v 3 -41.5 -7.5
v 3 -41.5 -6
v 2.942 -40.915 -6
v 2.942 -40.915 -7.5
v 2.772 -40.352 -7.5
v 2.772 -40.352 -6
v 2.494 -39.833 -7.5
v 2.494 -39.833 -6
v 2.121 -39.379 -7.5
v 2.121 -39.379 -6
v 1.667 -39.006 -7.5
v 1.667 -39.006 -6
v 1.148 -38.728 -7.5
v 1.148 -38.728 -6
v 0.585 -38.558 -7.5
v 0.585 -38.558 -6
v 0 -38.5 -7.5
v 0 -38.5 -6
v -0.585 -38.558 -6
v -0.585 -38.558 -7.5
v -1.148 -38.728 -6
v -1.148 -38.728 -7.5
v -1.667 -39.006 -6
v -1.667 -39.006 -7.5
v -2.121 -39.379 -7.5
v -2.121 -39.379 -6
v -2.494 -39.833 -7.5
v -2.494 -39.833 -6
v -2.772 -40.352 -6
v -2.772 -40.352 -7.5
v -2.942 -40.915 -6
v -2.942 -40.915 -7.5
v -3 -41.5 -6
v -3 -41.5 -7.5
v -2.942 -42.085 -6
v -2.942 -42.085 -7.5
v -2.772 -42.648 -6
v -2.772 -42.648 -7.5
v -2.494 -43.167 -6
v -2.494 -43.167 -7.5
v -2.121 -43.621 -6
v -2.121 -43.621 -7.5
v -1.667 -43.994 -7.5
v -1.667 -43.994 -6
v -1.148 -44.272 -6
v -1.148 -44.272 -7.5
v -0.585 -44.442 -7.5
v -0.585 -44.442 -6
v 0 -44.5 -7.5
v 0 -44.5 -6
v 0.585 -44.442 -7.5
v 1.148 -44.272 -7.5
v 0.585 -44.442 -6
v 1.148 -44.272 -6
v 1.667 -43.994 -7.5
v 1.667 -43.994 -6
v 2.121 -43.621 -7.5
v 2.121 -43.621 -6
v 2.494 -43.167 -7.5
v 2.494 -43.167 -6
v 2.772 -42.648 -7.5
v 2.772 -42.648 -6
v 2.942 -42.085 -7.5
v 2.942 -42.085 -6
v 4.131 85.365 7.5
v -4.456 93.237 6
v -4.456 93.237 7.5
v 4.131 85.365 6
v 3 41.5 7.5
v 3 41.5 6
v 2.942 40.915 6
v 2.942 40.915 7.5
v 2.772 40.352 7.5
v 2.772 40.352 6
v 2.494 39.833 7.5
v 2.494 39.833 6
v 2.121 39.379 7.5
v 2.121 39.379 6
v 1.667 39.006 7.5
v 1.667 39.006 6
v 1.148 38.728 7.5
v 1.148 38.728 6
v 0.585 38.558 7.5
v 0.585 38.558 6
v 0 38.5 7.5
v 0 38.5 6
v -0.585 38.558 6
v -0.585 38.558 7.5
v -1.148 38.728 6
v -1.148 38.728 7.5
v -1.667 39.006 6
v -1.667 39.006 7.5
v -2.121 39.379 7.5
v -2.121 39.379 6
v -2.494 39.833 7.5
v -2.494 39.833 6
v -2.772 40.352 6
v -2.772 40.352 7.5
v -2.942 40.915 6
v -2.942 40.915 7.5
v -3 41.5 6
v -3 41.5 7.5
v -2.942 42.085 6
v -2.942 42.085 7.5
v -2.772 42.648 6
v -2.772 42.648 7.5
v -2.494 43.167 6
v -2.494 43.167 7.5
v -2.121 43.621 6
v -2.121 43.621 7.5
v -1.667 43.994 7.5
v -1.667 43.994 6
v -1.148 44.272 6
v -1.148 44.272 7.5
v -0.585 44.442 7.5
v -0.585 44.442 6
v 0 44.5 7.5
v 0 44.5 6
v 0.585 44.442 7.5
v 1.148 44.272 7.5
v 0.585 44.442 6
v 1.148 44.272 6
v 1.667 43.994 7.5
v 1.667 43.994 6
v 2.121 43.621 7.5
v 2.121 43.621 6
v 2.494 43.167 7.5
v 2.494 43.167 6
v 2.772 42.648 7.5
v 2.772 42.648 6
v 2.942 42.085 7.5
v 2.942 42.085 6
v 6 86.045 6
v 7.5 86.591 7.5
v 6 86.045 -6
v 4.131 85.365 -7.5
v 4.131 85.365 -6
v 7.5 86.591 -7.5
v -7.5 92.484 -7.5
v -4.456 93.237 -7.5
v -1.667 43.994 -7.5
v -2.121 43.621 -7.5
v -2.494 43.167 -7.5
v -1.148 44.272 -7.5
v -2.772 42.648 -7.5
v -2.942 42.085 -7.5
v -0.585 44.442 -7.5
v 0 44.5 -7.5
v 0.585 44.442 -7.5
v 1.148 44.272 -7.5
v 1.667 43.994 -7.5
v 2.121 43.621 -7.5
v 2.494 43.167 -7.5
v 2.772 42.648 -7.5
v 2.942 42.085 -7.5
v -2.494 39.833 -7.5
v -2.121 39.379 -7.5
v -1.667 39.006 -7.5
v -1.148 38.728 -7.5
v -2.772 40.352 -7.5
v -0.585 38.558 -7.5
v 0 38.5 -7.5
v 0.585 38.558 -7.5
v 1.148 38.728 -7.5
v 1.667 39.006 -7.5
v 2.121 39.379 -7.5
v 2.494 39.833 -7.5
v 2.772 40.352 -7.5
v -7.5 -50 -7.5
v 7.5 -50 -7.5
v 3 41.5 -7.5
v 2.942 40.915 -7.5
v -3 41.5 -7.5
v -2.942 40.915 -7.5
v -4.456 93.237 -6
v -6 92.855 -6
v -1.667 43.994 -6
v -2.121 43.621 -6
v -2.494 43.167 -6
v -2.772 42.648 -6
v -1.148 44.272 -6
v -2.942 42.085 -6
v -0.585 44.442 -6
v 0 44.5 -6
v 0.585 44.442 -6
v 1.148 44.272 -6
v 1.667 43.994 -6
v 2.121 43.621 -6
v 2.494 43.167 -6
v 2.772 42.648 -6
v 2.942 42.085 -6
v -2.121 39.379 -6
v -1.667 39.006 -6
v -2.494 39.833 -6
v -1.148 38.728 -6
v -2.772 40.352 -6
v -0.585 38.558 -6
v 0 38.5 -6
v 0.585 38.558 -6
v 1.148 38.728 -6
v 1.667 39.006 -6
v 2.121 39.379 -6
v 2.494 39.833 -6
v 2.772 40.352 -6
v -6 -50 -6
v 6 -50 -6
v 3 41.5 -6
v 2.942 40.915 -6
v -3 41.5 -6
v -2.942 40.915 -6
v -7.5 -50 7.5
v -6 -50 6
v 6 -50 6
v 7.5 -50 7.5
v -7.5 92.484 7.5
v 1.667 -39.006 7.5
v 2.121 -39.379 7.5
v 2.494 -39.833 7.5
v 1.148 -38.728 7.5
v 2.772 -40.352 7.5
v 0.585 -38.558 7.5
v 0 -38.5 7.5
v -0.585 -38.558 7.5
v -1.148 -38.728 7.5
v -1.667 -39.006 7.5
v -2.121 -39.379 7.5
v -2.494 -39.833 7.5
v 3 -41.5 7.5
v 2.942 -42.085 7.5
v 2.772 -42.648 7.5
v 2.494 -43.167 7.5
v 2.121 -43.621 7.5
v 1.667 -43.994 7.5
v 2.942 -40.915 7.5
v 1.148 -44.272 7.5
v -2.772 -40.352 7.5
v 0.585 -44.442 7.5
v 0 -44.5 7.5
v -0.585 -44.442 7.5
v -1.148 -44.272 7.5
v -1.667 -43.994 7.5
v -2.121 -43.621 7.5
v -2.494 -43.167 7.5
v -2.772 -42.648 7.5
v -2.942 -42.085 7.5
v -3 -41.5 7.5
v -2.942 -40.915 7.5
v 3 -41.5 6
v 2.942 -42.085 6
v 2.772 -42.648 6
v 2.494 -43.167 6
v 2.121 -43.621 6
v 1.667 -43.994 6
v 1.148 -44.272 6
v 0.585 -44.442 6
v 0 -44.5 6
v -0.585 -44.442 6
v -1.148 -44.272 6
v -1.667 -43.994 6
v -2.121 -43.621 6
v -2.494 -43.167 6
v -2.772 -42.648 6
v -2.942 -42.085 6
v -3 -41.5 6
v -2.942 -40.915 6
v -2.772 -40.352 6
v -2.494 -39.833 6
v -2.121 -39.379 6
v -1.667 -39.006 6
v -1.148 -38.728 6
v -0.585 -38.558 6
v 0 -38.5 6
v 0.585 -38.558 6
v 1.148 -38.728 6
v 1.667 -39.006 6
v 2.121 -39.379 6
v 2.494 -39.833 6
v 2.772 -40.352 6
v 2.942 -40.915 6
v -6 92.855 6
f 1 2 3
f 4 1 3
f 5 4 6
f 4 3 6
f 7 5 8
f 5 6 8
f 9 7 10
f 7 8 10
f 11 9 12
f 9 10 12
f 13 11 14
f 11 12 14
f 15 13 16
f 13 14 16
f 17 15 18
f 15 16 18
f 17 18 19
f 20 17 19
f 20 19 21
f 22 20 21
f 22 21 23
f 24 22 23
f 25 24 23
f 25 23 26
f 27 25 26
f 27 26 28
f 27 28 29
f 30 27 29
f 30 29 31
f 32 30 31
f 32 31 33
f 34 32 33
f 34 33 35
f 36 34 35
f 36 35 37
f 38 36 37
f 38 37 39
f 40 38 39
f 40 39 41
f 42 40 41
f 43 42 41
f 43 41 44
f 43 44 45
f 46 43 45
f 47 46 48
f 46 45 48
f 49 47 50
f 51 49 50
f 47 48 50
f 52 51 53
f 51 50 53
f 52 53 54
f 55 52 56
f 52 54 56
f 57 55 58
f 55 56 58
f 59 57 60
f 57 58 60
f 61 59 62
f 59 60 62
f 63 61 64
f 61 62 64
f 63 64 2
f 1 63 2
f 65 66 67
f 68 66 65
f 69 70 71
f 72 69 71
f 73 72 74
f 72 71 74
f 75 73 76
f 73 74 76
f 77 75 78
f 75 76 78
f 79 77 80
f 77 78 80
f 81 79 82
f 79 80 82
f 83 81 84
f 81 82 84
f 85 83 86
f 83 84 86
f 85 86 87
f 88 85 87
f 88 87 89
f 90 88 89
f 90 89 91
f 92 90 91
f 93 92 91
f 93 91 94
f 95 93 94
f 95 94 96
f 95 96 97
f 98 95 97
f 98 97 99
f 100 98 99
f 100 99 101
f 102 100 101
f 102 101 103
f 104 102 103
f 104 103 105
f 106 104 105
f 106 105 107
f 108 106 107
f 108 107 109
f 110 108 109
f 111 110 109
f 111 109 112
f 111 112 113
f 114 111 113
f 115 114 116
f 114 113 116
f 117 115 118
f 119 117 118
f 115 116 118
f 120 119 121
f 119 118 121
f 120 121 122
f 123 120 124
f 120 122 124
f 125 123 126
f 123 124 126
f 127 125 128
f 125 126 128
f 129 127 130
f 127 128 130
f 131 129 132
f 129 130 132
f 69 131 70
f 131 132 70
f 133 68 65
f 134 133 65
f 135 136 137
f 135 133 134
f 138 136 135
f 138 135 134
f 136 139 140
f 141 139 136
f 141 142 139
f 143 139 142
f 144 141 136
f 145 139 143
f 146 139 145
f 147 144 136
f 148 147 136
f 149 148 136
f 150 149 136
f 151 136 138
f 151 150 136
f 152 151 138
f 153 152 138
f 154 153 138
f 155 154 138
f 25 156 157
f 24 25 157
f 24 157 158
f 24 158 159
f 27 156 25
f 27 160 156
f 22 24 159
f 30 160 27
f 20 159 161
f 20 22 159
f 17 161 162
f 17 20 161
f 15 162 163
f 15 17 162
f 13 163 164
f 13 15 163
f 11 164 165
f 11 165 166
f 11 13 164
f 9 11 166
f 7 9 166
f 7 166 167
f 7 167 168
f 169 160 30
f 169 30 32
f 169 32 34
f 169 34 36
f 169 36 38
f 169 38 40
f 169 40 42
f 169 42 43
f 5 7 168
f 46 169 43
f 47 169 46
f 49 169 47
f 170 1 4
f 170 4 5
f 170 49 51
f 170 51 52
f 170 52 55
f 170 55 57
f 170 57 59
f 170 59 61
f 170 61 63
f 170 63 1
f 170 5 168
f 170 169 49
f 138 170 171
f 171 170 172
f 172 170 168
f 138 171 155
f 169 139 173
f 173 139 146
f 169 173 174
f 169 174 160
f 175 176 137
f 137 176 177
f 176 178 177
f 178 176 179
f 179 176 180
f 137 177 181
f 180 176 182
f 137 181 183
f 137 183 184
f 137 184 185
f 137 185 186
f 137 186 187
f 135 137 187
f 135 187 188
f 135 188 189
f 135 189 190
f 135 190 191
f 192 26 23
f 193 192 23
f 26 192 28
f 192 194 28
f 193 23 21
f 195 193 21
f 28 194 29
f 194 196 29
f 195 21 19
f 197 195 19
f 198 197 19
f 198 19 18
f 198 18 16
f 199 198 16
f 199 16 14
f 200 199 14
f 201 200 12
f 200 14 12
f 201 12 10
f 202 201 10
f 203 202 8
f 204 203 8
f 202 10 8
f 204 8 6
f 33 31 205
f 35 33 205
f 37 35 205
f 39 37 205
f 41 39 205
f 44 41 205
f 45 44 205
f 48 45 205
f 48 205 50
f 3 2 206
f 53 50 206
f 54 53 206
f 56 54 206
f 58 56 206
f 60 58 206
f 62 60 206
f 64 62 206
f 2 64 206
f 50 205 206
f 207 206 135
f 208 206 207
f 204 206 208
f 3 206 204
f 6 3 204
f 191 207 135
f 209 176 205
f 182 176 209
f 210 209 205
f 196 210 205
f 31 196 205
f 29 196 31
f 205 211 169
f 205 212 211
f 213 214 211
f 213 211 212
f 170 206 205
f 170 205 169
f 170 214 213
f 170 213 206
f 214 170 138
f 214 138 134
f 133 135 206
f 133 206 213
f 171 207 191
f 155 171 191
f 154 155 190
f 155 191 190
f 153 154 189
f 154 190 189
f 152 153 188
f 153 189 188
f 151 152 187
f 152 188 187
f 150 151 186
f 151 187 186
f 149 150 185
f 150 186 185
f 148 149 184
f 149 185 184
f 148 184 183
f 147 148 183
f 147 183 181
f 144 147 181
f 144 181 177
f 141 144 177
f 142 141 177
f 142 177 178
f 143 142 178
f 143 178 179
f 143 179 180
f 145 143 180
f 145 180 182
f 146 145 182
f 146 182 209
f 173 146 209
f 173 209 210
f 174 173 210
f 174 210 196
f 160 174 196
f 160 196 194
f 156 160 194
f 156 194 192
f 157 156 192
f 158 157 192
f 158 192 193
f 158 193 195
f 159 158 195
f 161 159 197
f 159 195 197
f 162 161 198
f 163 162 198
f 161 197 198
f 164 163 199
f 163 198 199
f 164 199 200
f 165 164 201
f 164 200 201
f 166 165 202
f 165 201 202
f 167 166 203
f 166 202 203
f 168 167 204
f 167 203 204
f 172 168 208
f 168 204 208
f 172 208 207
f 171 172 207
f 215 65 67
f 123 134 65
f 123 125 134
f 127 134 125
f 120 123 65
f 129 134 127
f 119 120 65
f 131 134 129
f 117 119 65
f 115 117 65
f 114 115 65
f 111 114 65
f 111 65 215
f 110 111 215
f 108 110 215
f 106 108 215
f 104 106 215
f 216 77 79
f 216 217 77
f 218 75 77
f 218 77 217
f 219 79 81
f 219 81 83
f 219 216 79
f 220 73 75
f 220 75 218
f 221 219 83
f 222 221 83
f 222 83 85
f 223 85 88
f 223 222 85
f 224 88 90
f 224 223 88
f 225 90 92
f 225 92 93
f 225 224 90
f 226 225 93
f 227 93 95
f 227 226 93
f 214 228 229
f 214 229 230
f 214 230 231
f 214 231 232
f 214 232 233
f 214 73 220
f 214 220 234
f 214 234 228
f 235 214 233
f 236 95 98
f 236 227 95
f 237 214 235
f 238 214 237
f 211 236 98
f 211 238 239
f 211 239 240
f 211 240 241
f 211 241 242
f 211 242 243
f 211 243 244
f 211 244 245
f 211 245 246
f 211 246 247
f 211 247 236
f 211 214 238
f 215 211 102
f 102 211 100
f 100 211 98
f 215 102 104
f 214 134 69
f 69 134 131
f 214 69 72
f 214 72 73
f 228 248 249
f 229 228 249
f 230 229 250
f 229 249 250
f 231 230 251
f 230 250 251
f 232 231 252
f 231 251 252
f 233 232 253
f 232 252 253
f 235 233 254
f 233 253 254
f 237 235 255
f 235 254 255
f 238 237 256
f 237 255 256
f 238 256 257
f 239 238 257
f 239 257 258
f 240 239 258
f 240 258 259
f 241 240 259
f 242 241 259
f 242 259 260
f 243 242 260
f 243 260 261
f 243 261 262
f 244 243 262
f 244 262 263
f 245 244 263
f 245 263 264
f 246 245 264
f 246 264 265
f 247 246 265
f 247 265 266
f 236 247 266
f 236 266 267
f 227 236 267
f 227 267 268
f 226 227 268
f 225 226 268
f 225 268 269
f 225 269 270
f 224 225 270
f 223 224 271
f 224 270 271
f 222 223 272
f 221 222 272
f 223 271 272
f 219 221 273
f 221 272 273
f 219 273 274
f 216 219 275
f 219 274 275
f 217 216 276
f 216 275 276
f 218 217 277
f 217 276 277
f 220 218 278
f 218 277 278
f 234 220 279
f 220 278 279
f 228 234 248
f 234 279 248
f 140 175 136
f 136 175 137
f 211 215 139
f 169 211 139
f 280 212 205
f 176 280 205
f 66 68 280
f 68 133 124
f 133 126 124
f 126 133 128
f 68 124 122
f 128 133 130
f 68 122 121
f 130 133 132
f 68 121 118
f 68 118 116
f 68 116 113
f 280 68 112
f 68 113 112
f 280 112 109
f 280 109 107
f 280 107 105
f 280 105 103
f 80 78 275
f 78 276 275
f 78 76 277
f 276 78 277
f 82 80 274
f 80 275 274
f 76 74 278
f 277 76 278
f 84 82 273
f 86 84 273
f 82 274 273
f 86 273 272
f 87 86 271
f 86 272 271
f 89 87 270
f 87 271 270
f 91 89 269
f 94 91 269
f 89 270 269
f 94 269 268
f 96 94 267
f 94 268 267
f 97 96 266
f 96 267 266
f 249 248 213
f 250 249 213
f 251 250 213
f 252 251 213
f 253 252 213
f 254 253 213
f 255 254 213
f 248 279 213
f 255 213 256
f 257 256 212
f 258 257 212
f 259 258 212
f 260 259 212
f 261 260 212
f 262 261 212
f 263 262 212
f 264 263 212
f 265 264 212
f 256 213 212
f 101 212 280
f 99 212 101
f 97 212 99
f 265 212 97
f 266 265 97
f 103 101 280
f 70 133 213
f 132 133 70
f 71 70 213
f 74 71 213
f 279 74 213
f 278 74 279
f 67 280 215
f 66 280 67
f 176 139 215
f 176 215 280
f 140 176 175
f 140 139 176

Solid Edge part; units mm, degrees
sketch "Sketch1" plane through (0, 0, 0) normal (0, -1, 0) x (1, 0, 0)
  line L0 (-6, 6) -> (-6, -6)
  line L1 (-6, -6) -> (6, -6)
  line L2 (6, -6) -> (6, 6)
  line L3 (6, 6) -> (-6, 6)
  line L4 (-7.5, 7.5) -> (-7.5, -7.5)
  line L5 (-7.5, -7.5) -> (7.5, -7.5)
  line L6 (7.5, -7.5) -> (7.5, 7.5)
  line L7 (7.5, 7.5) -> (-7.5, 7.5)
  dimension "D1" = 15
  dimension "D2" = 12
extrude "ExtrudedProtrusion_1" add sketch "Sketch1" against normal blind 94 and the other way blind 50
sketch "Sketch2" plane through (0, 0, 0) normal (0, 0, 1) x (1, 0, 0)
  circle A0 centre (0, 41.5) radius 3
  circle A1 centre (0, -41.5) radius 3
  dimension "D1" = 6
  dimension "D2" = 83
extrude "Cutout1" cut sketch "Sketch2" along normal up to next and the other way up to next
sketch "Sketch3" plane through (0, 0, 0) normal (0, 0, 1) x (1, 0, 0)
  line L0 (-46.6431, 82.7984) -> (-4.4565, 93.2369)
  line L1 (-4.4565, 93.2369) -> (4.1313, 85.3647)
  line L2 (4.1313, 85.3647) -> (32.2719, 95.6112)
extrude "Cutout2" cut sketch "Sketch3" along normal up to next and the other way up to next material side at (-25.5618, 88.0662, 0)
